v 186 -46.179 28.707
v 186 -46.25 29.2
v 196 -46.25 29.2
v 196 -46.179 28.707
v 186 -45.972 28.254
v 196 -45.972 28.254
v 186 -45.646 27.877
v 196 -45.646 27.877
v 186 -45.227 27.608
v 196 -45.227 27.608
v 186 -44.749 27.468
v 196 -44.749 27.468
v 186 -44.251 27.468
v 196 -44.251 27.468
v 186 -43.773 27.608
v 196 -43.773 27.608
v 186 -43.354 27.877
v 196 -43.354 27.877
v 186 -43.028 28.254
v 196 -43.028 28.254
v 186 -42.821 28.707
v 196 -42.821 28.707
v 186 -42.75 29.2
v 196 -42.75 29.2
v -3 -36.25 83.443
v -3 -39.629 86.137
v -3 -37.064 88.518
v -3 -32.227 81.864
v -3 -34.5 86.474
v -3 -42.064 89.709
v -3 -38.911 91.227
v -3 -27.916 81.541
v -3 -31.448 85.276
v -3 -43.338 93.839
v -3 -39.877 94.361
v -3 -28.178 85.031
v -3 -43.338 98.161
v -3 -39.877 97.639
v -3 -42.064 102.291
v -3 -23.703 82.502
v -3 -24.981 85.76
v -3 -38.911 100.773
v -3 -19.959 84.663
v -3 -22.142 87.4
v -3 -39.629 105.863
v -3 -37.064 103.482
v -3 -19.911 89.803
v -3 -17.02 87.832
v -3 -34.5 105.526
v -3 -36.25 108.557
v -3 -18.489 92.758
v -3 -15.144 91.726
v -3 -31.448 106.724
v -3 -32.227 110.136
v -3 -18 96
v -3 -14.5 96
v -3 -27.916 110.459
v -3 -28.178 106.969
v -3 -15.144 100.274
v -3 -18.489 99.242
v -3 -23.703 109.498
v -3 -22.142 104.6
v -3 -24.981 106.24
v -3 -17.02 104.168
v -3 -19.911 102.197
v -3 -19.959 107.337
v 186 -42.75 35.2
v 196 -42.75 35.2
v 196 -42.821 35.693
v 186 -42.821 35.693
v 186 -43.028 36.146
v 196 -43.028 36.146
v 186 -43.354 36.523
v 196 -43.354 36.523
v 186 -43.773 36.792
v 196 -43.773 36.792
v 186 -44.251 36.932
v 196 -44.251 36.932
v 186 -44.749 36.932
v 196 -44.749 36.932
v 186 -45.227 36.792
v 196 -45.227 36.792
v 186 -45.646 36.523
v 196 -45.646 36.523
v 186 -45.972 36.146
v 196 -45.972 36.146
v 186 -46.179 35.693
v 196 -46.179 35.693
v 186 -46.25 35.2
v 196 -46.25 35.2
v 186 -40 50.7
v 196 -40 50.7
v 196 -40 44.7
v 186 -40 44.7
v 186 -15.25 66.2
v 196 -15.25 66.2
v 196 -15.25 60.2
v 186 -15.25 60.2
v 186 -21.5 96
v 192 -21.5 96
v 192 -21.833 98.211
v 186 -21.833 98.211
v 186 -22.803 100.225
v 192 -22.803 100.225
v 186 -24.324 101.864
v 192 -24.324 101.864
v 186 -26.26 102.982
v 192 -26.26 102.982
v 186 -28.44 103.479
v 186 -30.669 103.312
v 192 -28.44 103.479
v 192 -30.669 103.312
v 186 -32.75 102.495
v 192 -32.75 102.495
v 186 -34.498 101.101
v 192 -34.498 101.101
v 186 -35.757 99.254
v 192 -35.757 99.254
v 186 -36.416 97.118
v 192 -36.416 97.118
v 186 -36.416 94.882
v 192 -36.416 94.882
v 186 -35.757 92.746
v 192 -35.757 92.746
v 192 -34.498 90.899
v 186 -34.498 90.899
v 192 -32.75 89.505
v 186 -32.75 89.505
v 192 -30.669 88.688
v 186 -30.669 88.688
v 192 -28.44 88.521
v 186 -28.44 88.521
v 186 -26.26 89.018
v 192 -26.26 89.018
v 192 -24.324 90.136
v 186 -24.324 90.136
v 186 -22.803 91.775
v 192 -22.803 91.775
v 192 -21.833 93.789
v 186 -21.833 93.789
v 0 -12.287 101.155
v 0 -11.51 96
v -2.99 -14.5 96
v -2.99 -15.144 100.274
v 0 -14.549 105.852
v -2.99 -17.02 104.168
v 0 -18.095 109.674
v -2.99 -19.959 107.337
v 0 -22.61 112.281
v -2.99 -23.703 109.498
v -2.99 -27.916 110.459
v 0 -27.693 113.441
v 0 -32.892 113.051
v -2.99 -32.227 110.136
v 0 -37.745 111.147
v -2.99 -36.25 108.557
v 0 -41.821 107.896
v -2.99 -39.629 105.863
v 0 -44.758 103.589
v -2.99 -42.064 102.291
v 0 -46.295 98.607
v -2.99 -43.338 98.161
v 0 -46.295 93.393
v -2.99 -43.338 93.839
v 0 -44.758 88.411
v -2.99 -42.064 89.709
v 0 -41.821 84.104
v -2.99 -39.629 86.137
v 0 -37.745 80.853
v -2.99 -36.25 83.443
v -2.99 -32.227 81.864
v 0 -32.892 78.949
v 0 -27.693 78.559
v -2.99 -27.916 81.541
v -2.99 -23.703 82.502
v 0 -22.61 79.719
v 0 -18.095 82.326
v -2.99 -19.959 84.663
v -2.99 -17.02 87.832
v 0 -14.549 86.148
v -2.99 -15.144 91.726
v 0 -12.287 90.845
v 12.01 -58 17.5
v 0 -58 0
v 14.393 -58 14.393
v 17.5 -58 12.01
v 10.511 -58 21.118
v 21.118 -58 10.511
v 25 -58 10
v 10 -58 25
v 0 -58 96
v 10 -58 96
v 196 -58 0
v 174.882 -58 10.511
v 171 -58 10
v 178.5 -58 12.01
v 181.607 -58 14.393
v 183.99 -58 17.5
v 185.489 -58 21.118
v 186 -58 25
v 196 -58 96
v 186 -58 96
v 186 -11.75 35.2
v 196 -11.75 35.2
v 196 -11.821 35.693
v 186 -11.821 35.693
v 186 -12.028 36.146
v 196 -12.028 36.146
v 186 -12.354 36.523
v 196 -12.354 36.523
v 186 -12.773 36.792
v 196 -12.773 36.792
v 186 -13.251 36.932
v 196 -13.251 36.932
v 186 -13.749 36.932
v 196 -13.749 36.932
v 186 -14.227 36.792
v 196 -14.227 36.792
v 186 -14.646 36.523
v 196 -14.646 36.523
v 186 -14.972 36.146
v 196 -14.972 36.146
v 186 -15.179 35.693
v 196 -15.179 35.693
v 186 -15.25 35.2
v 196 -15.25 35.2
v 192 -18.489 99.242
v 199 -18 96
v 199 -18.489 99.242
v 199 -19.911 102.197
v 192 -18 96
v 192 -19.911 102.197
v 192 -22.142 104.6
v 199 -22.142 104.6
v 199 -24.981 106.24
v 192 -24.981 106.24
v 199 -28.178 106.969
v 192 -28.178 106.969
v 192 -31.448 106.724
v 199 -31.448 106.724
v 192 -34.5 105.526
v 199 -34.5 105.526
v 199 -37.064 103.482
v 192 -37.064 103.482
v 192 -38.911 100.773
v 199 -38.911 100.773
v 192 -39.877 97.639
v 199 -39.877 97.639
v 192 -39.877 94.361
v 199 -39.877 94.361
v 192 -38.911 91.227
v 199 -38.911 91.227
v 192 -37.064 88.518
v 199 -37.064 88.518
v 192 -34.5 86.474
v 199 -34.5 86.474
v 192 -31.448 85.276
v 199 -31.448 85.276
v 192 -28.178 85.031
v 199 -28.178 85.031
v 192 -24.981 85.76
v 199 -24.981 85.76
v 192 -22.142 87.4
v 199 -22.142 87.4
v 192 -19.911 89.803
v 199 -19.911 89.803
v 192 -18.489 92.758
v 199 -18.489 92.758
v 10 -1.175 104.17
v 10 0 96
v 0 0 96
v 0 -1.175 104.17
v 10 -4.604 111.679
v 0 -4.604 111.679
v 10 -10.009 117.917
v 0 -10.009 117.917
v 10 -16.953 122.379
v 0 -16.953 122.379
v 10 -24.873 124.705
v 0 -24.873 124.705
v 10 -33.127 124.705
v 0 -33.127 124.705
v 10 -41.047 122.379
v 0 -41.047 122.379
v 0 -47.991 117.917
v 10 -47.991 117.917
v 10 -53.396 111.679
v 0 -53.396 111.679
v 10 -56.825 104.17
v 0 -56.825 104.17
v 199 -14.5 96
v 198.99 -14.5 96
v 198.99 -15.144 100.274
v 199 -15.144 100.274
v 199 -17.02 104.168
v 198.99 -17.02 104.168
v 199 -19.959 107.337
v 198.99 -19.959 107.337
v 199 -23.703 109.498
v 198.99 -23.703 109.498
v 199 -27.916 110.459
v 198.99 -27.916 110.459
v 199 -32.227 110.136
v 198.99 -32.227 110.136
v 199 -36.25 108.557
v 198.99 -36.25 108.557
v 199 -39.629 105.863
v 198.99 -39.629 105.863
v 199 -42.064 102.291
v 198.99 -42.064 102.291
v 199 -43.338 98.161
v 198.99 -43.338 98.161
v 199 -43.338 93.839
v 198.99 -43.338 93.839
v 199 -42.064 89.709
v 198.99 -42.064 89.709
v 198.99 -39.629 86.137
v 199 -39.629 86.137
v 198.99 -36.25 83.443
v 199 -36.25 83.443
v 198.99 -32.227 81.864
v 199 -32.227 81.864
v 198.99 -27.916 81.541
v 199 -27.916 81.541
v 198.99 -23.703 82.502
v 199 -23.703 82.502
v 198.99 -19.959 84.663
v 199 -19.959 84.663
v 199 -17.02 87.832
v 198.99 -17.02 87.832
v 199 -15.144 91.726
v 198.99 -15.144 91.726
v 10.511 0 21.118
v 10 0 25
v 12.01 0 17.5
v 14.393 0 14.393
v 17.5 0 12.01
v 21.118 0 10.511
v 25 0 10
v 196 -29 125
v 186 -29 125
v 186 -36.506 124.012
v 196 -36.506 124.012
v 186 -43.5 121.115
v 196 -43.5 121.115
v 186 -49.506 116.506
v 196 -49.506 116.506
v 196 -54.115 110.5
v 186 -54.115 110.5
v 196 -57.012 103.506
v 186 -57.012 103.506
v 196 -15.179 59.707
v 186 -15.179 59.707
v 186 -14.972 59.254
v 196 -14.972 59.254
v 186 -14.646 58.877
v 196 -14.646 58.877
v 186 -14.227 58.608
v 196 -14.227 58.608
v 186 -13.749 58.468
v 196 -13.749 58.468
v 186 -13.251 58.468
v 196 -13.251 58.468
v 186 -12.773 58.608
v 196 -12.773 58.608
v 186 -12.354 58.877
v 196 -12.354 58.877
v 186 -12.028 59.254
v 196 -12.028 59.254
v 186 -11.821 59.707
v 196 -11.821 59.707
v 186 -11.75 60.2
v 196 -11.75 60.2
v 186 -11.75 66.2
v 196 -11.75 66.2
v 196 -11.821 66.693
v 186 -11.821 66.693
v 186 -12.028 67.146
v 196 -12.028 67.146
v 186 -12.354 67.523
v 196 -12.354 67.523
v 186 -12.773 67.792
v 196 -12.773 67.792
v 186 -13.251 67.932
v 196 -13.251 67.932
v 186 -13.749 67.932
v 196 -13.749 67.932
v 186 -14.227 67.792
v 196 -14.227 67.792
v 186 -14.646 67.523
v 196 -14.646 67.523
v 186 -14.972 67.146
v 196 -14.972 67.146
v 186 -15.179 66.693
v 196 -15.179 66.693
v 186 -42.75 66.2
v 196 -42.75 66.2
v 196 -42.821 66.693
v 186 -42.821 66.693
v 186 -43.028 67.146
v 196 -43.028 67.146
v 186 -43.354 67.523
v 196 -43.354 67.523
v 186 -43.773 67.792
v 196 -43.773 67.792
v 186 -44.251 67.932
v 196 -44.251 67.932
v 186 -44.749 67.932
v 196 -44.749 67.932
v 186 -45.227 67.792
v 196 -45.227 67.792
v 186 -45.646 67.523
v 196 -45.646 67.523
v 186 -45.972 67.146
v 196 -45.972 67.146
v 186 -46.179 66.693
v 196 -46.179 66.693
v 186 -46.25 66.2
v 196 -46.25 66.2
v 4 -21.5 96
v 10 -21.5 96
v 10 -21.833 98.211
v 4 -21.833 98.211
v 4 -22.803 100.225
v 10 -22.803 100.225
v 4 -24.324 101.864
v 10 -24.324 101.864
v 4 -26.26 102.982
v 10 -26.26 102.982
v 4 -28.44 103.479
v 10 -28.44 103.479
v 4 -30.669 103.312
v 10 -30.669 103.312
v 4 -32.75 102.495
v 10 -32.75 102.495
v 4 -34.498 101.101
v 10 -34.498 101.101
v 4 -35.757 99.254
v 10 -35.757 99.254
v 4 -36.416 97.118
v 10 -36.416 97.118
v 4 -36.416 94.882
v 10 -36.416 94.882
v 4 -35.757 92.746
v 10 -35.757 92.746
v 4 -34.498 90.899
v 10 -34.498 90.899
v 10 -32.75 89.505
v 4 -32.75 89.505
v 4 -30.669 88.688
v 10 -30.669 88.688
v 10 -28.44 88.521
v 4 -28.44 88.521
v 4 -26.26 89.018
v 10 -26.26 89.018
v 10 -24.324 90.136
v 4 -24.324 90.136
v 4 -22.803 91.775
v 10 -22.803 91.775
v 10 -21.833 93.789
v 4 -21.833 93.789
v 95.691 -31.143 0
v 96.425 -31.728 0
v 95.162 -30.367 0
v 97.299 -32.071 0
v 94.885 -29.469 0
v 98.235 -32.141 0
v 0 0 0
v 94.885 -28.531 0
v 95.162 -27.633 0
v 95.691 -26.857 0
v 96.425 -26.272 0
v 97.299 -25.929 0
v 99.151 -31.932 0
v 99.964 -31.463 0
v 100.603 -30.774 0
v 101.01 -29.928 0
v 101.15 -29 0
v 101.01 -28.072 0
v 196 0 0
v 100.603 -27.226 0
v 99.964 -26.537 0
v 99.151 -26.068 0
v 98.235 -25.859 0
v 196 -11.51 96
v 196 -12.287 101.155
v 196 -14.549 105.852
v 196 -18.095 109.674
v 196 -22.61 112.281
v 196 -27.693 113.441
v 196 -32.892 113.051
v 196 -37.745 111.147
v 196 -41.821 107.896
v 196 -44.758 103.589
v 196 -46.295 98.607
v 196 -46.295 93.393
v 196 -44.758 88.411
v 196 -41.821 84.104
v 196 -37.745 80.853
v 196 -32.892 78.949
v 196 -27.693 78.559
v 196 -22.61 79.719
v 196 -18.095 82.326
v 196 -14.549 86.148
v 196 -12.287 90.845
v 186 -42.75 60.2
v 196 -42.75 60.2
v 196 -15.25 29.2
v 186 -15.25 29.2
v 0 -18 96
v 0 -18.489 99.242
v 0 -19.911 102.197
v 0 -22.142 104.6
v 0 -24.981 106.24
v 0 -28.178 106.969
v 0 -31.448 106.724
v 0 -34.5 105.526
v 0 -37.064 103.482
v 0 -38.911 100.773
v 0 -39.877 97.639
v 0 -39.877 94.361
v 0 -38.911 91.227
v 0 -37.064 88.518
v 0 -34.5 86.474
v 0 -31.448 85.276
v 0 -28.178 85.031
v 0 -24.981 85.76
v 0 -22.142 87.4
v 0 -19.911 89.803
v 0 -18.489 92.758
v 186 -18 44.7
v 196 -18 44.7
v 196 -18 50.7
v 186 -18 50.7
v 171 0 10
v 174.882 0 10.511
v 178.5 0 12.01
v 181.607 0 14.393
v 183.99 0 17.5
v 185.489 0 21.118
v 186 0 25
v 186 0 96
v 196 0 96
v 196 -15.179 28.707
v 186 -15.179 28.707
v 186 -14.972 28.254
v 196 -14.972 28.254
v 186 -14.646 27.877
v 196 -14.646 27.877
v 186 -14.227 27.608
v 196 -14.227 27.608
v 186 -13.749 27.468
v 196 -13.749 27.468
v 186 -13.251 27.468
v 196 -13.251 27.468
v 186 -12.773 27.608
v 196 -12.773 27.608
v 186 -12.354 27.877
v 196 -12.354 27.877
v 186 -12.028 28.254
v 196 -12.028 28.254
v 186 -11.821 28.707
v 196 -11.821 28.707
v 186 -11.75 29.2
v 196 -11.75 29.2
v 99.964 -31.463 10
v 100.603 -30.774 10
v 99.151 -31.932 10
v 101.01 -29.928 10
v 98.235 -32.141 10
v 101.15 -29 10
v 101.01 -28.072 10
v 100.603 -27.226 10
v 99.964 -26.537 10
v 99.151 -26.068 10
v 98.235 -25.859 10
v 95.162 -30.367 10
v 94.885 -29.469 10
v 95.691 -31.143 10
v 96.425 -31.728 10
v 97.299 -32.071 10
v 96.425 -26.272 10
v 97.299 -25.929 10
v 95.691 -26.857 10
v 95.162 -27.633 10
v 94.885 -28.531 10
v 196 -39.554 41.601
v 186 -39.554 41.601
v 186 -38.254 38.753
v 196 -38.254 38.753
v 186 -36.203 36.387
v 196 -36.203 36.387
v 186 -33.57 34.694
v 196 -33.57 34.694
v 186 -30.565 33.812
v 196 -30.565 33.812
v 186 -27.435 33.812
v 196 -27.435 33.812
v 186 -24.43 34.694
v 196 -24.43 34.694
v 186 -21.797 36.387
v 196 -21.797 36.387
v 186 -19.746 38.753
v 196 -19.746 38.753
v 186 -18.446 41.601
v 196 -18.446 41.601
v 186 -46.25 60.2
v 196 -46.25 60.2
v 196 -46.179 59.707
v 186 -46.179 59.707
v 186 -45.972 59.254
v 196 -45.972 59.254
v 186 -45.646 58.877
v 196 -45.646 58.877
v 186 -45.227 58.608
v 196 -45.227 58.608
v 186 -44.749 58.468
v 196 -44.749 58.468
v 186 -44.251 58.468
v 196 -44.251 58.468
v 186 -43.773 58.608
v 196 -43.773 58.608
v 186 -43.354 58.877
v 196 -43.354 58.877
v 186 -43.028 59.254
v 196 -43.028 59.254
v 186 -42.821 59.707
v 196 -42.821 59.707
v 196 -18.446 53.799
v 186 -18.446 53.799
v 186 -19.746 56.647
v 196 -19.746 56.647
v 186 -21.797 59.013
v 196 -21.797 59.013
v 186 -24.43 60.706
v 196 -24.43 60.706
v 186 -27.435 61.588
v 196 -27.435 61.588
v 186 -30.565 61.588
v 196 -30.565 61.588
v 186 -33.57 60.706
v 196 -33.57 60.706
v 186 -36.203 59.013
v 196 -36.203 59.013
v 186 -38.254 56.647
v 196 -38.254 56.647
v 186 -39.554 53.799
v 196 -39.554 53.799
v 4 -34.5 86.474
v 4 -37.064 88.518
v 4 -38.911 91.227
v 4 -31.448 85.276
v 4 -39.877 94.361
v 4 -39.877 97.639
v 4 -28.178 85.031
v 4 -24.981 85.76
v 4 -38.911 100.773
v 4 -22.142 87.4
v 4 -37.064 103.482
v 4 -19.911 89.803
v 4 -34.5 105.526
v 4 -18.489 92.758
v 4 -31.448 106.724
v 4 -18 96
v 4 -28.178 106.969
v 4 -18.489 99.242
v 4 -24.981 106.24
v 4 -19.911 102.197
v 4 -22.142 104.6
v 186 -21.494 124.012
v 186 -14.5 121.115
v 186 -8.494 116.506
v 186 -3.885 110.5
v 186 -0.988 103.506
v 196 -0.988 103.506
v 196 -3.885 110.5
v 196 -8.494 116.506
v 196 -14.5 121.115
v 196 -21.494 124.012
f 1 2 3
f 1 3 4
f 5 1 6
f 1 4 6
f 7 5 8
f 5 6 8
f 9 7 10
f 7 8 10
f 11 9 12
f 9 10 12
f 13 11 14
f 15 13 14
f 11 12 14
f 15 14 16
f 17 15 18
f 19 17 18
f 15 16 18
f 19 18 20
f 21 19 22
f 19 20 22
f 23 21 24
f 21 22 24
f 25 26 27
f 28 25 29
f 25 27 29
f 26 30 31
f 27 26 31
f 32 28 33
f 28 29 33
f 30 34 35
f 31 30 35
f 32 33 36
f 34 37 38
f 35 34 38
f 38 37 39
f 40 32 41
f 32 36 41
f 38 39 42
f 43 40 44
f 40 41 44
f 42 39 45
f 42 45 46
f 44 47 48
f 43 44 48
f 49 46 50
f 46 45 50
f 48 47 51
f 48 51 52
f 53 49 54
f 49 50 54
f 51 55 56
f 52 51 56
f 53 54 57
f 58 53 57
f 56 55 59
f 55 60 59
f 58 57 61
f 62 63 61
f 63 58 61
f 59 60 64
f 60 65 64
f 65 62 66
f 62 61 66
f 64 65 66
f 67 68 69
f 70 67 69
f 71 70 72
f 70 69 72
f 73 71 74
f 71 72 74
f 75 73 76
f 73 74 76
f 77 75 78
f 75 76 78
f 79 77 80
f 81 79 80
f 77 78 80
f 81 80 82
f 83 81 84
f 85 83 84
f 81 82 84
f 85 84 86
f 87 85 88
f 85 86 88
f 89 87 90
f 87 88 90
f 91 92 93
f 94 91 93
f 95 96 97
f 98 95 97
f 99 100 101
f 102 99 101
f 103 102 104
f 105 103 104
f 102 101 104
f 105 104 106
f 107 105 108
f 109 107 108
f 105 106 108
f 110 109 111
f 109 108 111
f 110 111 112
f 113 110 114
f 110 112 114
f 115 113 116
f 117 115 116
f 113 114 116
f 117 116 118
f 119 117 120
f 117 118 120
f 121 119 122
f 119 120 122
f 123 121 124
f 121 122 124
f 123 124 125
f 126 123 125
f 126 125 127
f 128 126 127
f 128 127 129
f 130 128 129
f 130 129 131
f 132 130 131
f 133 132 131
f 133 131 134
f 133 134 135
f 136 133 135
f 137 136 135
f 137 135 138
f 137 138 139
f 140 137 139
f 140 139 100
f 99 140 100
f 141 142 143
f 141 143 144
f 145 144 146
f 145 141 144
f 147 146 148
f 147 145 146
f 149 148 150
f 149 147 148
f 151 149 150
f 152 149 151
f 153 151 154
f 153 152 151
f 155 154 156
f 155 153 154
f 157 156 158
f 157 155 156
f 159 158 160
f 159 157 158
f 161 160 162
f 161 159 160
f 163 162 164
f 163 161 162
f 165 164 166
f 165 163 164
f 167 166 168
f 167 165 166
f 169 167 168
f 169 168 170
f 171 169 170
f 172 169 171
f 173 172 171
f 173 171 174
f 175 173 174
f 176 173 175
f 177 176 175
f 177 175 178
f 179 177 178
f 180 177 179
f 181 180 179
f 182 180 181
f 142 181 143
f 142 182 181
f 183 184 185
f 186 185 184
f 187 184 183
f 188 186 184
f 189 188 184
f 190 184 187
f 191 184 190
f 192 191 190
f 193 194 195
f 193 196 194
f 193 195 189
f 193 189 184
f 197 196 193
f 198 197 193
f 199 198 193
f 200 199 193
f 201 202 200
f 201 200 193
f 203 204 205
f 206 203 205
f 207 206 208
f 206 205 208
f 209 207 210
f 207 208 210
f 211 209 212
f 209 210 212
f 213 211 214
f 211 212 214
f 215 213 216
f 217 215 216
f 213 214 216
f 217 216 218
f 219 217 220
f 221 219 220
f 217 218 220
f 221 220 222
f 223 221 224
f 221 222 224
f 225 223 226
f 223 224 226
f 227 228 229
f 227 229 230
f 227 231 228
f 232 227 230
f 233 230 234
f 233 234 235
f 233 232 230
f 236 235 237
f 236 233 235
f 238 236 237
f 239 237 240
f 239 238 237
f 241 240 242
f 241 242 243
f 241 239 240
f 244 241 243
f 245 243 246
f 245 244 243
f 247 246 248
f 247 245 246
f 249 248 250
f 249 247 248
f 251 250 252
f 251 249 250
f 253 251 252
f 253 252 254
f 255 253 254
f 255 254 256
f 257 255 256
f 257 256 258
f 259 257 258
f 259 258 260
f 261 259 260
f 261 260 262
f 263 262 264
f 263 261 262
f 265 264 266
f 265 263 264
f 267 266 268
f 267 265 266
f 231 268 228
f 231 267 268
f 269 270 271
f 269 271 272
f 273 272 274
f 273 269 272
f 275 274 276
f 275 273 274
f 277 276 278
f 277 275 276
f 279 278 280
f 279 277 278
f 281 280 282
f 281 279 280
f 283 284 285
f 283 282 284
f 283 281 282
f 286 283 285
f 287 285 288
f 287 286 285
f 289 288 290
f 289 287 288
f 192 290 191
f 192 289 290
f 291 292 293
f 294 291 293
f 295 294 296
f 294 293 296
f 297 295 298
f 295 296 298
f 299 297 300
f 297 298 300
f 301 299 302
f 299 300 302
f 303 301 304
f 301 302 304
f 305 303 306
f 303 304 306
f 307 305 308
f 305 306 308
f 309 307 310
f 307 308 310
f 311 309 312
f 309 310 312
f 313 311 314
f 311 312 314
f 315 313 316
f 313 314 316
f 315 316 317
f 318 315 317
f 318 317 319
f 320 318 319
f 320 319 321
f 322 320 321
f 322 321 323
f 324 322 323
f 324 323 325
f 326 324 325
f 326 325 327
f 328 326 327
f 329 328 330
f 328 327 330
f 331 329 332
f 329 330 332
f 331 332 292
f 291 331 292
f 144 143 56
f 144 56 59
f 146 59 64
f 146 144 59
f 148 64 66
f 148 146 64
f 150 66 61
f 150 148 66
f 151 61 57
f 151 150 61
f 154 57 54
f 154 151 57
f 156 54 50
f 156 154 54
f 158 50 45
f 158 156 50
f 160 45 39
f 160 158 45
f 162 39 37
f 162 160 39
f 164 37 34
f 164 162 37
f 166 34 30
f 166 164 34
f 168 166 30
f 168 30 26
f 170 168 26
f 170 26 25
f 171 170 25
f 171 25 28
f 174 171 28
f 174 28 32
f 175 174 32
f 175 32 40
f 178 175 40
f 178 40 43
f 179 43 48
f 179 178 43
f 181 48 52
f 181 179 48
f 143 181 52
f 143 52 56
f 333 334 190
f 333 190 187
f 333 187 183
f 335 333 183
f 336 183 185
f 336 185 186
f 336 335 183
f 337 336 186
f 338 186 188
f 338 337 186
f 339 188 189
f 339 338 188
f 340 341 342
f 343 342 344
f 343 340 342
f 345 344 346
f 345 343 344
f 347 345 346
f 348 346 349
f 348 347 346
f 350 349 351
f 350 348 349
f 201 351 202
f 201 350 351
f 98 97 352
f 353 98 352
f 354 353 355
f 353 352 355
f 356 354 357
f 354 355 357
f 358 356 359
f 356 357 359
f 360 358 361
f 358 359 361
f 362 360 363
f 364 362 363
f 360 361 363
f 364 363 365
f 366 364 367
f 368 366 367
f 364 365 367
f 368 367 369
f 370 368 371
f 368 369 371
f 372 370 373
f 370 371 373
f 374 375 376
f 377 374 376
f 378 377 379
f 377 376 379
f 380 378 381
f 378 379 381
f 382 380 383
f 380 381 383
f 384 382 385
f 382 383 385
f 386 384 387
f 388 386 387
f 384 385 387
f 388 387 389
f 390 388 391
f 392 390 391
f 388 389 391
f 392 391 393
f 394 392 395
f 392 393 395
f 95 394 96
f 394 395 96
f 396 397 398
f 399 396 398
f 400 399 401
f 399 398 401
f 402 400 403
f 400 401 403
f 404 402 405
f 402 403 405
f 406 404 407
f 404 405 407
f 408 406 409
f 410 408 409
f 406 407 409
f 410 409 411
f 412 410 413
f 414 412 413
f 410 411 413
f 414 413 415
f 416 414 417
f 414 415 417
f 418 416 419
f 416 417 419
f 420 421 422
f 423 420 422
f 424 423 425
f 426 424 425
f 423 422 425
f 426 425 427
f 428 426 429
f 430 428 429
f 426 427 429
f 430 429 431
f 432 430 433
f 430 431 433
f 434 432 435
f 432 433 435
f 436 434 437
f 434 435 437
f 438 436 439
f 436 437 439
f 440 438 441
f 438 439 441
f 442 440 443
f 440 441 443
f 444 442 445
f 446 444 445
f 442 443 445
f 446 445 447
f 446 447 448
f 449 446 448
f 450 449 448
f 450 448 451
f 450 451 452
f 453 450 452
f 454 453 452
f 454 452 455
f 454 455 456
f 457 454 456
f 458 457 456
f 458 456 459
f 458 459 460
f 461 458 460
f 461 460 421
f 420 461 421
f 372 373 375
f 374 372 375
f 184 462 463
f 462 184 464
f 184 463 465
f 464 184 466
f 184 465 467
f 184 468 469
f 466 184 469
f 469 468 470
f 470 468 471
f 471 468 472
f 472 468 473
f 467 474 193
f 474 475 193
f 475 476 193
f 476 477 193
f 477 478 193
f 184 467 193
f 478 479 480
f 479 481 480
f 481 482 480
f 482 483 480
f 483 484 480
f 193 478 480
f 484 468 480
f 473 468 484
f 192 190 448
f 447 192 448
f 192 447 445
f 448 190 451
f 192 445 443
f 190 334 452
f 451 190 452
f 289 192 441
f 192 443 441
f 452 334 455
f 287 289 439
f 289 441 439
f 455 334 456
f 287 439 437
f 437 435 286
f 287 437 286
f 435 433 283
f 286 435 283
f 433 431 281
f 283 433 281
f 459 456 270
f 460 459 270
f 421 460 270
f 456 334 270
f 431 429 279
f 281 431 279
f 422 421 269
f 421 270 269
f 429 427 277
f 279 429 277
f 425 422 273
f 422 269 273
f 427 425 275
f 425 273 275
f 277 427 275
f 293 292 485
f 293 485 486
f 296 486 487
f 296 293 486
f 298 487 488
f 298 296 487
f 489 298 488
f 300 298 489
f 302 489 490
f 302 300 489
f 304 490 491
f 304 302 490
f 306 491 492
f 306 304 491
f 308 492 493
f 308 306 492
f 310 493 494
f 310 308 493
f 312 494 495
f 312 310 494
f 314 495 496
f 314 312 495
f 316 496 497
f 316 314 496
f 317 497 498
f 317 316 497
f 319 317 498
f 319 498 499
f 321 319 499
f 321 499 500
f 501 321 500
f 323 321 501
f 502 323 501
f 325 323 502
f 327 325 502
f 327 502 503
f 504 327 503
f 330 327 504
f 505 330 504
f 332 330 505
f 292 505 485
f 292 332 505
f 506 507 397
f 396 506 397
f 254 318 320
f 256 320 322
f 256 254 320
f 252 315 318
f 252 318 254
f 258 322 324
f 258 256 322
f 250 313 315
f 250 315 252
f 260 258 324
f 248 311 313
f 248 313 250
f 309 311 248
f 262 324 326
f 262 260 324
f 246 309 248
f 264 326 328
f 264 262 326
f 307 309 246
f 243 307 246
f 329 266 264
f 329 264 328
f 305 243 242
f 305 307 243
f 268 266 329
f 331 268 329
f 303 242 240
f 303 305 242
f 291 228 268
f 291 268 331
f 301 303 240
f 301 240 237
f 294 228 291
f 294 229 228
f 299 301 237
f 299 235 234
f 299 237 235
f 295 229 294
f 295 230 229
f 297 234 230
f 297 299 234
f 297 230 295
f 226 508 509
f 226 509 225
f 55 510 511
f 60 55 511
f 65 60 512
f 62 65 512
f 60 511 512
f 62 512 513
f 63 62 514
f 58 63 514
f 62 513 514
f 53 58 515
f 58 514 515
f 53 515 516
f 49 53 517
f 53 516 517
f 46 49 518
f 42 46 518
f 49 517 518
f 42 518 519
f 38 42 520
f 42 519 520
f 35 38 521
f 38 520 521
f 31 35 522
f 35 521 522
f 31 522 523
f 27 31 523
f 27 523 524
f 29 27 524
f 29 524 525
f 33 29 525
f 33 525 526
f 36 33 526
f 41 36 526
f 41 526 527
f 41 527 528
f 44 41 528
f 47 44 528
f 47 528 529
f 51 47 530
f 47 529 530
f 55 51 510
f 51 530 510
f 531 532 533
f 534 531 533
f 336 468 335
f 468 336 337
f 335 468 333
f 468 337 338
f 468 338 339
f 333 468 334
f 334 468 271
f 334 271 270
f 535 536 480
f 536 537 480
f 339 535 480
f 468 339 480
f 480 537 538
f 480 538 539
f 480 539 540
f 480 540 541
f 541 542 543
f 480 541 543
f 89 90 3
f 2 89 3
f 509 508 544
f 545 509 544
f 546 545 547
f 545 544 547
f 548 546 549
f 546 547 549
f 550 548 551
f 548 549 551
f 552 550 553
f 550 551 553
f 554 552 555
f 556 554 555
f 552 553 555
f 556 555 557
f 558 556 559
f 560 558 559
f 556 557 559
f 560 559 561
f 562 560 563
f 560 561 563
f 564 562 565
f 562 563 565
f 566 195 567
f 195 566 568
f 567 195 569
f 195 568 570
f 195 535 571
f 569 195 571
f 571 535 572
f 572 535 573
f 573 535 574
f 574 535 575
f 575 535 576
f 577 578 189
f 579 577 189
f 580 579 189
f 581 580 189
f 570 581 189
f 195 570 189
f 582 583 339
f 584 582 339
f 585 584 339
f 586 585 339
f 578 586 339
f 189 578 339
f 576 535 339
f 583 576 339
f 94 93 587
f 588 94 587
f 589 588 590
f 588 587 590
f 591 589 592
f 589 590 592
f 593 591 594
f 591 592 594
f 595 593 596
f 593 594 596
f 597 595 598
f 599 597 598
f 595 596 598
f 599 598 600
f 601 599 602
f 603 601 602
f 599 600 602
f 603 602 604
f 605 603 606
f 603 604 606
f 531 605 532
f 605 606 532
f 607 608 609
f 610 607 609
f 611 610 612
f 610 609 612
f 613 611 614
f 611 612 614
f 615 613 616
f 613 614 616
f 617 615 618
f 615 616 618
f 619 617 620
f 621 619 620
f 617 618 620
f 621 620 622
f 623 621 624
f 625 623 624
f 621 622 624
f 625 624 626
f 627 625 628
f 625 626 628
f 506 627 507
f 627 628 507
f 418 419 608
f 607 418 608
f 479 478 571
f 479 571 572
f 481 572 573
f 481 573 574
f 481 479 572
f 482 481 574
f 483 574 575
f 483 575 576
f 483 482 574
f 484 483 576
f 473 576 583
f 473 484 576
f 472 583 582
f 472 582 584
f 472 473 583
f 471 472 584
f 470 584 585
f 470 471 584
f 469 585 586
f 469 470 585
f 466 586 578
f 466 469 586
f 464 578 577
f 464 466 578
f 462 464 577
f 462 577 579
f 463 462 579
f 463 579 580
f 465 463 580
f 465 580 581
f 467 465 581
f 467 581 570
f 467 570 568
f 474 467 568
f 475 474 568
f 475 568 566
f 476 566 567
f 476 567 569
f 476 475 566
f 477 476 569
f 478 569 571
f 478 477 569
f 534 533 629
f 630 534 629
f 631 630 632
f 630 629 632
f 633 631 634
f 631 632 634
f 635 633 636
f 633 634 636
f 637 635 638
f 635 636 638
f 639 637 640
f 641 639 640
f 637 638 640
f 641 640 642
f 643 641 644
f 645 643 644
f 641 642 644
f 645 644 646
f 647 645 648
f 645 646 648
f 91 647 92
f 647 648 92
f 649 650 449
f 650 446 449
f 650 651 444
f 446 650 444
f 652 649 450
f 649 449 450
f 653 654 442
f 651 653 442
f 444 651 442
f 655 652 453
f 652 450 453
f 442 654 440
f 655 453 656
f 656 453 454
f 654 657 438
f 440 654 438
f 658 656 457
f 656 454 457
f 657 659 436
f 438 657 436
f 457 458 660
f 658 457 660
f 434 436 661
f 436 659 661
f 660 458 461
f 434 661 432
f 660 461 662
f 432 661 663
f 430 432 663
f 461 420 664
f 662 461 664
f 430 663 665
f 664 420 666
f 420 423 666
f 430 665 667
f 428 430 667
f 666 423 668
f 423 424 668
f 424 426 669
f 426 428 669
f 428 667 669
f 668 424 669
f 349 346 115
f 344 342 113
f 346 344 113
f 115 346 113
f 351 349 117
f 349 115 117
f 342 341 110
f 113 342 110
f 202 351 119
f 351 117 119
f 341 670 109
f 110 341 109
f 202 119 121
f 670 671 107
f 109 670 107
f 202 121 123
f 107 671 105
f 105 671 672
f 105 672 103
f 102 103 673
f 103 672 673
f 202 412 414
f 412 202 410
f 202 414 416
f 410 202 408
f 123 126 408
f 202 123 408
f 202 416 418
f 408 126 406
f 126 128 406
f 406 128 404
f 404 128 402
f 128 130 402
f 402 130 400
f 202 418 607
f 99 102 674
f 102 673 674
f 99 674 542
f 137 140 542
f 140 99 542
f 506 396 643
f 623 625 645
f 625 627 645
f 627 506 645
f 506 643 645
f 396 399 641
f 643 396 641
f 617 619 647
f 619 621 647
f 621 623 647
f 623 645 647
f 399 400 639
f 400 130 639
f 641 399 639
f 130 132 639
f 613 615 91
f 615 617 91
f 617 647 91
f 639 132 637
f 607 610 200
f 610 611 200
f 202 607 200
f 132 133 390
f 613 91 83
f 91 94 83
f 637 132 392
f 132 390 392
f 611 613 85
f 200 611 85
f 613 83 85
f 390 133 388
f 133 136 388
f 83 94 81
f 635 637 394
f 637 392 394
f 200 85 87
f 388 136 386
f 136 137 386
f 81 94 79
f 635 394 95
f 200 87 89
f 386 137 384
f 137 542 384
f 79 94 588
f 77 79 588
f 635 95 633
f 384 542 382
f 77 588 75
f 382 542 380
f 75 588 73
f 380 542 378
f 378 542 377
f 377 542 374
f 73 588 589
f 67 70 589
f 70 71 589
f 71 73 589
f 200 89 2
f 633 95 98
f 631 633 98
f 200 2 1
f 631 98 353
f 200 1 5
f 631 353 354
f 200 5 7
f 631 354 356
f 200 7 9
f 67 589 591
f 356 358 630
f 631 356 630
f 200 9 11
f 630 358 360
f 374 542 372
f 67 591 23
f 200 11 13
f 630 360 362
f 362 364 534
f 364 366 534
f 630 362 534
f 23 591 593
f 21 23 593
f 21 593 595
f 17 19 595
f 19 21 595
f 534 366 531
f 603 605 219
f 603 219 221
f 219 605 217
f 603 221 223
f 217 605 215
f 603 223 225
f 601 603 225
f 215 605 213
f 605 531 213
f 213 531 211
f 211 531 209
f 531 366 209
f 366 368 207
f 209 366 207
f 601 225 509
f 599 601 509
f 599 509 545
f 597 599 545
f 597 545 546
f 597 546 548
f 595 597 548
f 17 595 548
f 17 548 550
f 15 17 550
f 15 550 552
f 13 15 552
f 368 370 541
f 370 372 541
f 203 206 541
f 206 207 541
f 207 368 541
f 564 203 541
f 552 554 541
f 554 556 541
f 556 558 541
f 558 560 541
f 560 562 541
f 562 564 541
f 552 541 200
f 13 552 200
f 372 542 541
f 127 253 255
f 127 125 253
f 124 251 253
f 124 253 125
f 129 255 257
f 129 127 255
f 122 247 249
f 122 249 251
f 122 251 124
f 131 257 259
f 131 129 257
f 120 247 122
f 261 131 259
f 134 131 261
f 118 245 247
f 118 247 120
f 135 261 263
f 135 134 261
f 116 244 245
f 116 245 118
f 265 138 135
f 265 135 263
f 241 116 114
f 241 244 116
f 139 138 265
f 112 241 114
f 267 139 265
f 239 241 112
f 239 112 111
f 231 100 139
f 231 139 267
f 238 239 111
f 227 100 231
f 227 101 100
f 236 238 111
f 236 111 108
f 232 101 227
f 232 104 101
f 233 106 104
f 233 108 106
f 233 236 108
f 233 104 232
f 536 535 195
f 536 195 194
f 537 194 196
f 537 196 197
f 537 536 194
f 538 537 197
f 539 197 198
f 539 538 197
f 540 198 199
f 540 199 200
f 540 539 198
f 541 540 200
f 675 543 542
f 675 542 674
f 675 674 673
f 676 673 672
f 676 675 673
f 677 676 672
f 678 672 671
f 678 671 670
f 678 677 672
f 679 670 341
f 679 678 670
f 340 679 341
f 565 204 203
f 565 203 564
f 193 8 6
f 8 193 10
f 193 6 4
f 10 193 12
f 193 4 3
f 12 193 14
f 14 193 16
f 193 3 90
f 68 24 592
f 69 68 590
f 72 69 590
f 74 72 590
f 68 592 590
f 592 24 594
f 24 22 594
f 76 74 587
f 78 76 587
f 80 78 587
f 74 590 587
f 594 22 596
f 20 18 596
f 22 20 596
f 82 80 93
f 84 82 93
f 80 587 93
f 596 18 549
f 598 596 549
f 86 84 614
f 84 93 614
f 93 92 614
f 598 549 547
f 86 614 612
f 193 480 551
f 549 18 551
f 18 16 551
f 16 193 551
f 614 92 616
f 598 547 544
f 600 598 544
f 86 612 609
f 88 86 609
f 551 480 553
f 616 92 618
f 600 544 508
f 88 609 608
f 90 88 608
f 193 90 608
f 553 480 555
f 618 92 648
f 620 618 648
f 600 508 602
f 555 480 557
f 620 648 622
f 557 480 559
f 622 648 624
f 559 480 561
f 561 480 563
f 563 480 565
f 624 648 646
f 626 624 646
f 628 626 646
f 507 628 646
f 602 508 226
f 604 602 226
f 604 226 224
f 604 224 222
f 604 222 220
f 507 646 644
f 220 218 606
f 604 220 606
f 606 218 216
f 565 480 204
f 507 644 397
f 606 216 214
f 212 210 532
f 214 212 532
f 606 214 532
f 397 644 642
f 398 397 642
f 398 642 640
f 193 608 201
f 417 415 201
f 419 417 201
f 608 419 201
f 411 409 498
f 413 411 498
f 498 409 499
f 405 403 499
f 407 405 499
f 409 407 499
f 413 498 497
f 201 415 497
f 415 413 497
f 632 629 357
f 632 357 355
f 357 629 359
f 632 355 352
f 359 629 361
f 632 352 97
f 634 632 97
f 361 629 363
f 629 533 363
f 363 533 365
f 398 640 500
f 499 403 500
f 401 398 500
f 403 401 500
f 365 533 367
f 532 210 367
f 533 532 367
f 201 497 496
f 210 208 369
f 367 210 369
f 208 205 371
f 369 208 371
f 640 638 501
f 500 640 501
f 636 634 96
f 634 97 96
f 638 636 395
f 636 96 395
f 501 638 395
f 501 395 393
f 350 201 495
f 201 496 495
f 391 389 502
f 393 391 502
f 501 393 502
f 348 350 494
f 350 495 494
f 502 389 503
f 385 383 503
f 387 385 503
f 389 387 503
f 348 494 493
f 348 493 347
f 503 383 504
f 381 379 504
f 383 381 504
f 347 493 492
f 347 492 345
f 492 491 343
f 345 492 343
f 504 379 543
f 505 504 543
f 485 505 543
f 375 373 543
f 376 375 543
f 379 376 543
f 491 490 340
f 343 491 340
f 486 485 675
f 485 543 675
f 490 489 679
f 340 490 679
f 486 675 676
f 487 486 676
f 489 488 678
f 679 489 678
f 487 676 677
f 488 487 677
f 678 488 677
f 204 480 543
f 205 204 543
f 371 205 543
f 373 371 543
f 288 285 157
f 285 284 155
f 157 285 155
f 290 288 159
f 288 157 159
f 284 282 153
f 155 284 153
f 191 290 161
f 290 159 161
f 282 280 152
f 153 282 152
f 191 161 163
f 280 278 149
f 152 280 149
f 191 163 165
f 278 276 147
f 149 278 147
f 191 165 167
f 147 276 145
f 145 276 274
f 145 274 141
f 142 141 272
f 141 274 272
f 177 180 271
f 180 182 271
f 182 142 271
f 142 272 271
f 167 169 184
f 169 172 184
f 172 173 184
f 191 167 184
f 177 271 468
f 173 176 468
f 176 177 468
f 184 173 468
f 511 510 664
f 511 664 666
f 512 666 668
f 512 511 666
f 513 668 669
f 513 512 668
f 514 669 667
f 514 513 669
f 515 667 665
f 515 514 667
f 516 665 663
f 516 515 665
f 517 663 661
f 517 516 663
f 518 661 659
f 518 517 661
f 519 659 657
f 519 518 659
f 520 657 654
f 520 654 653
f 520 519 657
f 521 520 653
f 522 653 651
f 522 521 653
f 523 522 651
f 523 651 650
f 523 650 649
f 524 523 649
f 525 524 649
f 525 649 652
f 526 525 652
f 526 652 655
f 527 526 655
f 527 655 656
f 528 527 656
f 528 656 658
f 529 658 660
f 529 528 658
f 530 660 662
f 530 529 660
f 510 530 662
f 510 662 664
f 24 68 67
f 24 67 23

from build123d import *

# Parameters (mm, degrees)
PAD_DEPTH       = 58
POCKET_DEPTH    = 10
SKETCH002_R     = 11
POCKET001_DEPTH = 4
SKETCH003_R     = 14.5
SKETCH003_R_2   = 11
PAD001_DEPTH    = 3
SKETCH004_R     = 11
POCKET002_DEPTH = 4
SKETCH005_R     = 14.5
SKETCH005_R_2   = 11
PAD002_DEPTH    = 3
SKETCH006_R     = 3.15
POCKET003_DEPTH = 10
SKETCH007_R     = 7.5
POCKET004_DEPTH = 199.001
CHAMFER_SIZE    = 2.99


with BuildPart() as part:
    # Sketch → Pad (new body)
    with BuildSketch(Plane.XZ):
        with BuildLine():
            Line((0, 125), (0, 0))
            Line((0, 0), (196, 0))
            Line((196, 0), (196, 125))
            Line((196, 125), (186, 125))
            Line((186, 125), (186, 25))
            ThreePointArc((171, 10), (181.606602, 14.393398), (186, 25))
            Line((171, 10), (25, 10))
            ThreePointArc((10, 25), (14.393398, 14.393398), (25, 10))
            Line((10, 25), (10, 125))
            Line((10, 125), (0, 125))
        make_face()
    extrude(amount=PAD_DEPTH)

    # Sketch001 (on DatumPlane) → Pocket (cut)
    with BuildSketch(Plane.YZ.offset(196)):
        with BuildLine():
            Line((-40, 47.7), (-40, 44.7))
            ThreePointArc((-40, 44.7), (-29, 33.7), (-18, 44.7))
            Line((-18, 47.7), (-18, 44.7))
            Line((-18, 47.7), (-18, 50.7))
            ThreePointArc((-18, 50.7), (-29, 61.7), (-40, 50.7))
            Line((-40, 47.7), (-40, 50.7))
        make_face()
        with BuildLine():
            Line((-42.75, 60.2), (-42.75, 63.2))
            Line((-42.75, 63.2), (-42.75, 66.2))
            ThreePointArc((-42.75, 66.2), (-44.5, 67.95), (-46.25, 66.2))
            Line((-46.25, 66.2), (-46.25, 63.2))
            Line((-46.25, 63.2), (-46.25, 60.2))
            ThreePointArc((-46.25, 60.2), (-44.5, 58.45), (-42.75, 60.2))
        make_face()
        with BuildLine():
            Line((-11.75, 63.2), (-11.75, 60.2))
            ThreePointArc((-15.25, 60.2), (-13.5, 58.45), (-11.75, 60.2))
            Line((-15.25, 63.2), (-15.25, 60.2))
            Line((-15.25, 66.2), (-15.25, 63.2))
            ThreePointArc((-11.75, 66.2), (-13.5, 67.95), (-15.25, 66.2))
            Line((-11.75, 63.2), (-11.75, 66.2))
        make_face()
        with BuildLine():
            Line((-46.25, 35.2), (-46.25, 32.2))
            Line((-46.25, 29.200012), (-46.25, 32.2))
            ThreePointArc((-46.25, 29.200012), (-44.500006, 27.450012), (-42.75, 29.2))
            Line((-42.75, 32.2), (-42.75, 29.2))
            Line((-42.75, 35.2), (-42.75, 32.2))
            ThreePointArc((-42.75, 35.2), (-44.5, 36.95), (-46.25, 35.2))
        make_face()
        with BuildLine():
            Line((-11.75, 35.2), (-11.75, 32.2))
            Line((-11.75, 32.2), (-11.75, 29.2))
            ThreePointArc((-15.25, 29.2), (-13.5, 27.45), (-11.75, 29.2))
            Line((-15.25, 29.2), (-15.25, 32.2))
            Line((-15.25, 32.2), (-15.25, 35.2))
            ThreePointArc((-11.75, 35.2), (-13.5, 36.95), (-15.25, 35.2))
        make_face()
    extrude(amount=-POCKET_DEPTH, mode=Mode.SUBTRACT)

    # Sketch002 (on DatumPlane) → Pocket001 (cut)
    with BuildSketch(Plane.YZ.offset(196)):
        with Locations((-29, 96)):
            Circle(SKETCH002_R)
    extrude(amount=-POCKET001_DEPTH, mode=Mode.SUBTRACT)

    # Sketch003 (on DatumPlane) → Pad001 (join)
    with BuildSketch(Plane.YZ.offset(196)):
        with Locations((-29, 96)):
            Circle(SKETCH003_R)
        with Locations((-29, 96)):
            Circle(SKETCH003_R_2, mode=Mode.SUBTRACT)
    extrude(amount=PAD001_DEPTH)

    # Sketch004 → Pocket002 (cut)
    with BuildSketch(Plane.YZ):
        with Locations((-29, 96)):
            Circle(SKETCH004_R)
    extrude(amount=POCKET002_DEPTH, mode=Mode.SUBTRACT)

    # Sketch005 → Pad002 (join)
    with BuildSketch(Plane.YZ):
        with Locations((-29, 96)):
            Circle(SKETCH005_R)
        with Locations((-29, 96)):
            Circle(SKETCH005_R_2, mode=Mode.SUBTRACT)
    extrude(amount=-PAD002_DEPTH)

    # Sketch006 → Pocket003 (cut)
    with BuildSketch(Plane.XY):
        with Locations((98, -29)):
            Circle(SKETCH006_R)
    extrude(amount=POCKET003_DEPTH, mode=Mode.SUBTRACT)

    # Sketch007 (on DatumPlane) → Pocket004 (cut, through all)
    with BuildSketch(Plane.YZ.offset(196)):
        with Locations((-29, 96)):
            Circle(SKETCH007_R)
        with BuildLine():
            ThreePointArc((0, 96), (-29, 125), (-58, 96))
            Line((-58, 96), (-68, 96))
            Line((-68, 96), (-68, 136))
            Line((-68, 136), (10, 136))
            Line((10, 136), (10, 96))
            Line((10, 96), (0, 96))
        make_face()
    extrude(amount=-POCKET004_DEPTH, mode=Mode.SUBTRACT)

    # Chamfer
    chamfer_edges = [part.edges().sort_by_distance(p)[0] for p in [
        (0, -43.5, 96),
        (196, -43.5, 96),
    ]]
    chamfer(chamfer_edges, length=CHAMFER_SIZE)


solid = part.part
